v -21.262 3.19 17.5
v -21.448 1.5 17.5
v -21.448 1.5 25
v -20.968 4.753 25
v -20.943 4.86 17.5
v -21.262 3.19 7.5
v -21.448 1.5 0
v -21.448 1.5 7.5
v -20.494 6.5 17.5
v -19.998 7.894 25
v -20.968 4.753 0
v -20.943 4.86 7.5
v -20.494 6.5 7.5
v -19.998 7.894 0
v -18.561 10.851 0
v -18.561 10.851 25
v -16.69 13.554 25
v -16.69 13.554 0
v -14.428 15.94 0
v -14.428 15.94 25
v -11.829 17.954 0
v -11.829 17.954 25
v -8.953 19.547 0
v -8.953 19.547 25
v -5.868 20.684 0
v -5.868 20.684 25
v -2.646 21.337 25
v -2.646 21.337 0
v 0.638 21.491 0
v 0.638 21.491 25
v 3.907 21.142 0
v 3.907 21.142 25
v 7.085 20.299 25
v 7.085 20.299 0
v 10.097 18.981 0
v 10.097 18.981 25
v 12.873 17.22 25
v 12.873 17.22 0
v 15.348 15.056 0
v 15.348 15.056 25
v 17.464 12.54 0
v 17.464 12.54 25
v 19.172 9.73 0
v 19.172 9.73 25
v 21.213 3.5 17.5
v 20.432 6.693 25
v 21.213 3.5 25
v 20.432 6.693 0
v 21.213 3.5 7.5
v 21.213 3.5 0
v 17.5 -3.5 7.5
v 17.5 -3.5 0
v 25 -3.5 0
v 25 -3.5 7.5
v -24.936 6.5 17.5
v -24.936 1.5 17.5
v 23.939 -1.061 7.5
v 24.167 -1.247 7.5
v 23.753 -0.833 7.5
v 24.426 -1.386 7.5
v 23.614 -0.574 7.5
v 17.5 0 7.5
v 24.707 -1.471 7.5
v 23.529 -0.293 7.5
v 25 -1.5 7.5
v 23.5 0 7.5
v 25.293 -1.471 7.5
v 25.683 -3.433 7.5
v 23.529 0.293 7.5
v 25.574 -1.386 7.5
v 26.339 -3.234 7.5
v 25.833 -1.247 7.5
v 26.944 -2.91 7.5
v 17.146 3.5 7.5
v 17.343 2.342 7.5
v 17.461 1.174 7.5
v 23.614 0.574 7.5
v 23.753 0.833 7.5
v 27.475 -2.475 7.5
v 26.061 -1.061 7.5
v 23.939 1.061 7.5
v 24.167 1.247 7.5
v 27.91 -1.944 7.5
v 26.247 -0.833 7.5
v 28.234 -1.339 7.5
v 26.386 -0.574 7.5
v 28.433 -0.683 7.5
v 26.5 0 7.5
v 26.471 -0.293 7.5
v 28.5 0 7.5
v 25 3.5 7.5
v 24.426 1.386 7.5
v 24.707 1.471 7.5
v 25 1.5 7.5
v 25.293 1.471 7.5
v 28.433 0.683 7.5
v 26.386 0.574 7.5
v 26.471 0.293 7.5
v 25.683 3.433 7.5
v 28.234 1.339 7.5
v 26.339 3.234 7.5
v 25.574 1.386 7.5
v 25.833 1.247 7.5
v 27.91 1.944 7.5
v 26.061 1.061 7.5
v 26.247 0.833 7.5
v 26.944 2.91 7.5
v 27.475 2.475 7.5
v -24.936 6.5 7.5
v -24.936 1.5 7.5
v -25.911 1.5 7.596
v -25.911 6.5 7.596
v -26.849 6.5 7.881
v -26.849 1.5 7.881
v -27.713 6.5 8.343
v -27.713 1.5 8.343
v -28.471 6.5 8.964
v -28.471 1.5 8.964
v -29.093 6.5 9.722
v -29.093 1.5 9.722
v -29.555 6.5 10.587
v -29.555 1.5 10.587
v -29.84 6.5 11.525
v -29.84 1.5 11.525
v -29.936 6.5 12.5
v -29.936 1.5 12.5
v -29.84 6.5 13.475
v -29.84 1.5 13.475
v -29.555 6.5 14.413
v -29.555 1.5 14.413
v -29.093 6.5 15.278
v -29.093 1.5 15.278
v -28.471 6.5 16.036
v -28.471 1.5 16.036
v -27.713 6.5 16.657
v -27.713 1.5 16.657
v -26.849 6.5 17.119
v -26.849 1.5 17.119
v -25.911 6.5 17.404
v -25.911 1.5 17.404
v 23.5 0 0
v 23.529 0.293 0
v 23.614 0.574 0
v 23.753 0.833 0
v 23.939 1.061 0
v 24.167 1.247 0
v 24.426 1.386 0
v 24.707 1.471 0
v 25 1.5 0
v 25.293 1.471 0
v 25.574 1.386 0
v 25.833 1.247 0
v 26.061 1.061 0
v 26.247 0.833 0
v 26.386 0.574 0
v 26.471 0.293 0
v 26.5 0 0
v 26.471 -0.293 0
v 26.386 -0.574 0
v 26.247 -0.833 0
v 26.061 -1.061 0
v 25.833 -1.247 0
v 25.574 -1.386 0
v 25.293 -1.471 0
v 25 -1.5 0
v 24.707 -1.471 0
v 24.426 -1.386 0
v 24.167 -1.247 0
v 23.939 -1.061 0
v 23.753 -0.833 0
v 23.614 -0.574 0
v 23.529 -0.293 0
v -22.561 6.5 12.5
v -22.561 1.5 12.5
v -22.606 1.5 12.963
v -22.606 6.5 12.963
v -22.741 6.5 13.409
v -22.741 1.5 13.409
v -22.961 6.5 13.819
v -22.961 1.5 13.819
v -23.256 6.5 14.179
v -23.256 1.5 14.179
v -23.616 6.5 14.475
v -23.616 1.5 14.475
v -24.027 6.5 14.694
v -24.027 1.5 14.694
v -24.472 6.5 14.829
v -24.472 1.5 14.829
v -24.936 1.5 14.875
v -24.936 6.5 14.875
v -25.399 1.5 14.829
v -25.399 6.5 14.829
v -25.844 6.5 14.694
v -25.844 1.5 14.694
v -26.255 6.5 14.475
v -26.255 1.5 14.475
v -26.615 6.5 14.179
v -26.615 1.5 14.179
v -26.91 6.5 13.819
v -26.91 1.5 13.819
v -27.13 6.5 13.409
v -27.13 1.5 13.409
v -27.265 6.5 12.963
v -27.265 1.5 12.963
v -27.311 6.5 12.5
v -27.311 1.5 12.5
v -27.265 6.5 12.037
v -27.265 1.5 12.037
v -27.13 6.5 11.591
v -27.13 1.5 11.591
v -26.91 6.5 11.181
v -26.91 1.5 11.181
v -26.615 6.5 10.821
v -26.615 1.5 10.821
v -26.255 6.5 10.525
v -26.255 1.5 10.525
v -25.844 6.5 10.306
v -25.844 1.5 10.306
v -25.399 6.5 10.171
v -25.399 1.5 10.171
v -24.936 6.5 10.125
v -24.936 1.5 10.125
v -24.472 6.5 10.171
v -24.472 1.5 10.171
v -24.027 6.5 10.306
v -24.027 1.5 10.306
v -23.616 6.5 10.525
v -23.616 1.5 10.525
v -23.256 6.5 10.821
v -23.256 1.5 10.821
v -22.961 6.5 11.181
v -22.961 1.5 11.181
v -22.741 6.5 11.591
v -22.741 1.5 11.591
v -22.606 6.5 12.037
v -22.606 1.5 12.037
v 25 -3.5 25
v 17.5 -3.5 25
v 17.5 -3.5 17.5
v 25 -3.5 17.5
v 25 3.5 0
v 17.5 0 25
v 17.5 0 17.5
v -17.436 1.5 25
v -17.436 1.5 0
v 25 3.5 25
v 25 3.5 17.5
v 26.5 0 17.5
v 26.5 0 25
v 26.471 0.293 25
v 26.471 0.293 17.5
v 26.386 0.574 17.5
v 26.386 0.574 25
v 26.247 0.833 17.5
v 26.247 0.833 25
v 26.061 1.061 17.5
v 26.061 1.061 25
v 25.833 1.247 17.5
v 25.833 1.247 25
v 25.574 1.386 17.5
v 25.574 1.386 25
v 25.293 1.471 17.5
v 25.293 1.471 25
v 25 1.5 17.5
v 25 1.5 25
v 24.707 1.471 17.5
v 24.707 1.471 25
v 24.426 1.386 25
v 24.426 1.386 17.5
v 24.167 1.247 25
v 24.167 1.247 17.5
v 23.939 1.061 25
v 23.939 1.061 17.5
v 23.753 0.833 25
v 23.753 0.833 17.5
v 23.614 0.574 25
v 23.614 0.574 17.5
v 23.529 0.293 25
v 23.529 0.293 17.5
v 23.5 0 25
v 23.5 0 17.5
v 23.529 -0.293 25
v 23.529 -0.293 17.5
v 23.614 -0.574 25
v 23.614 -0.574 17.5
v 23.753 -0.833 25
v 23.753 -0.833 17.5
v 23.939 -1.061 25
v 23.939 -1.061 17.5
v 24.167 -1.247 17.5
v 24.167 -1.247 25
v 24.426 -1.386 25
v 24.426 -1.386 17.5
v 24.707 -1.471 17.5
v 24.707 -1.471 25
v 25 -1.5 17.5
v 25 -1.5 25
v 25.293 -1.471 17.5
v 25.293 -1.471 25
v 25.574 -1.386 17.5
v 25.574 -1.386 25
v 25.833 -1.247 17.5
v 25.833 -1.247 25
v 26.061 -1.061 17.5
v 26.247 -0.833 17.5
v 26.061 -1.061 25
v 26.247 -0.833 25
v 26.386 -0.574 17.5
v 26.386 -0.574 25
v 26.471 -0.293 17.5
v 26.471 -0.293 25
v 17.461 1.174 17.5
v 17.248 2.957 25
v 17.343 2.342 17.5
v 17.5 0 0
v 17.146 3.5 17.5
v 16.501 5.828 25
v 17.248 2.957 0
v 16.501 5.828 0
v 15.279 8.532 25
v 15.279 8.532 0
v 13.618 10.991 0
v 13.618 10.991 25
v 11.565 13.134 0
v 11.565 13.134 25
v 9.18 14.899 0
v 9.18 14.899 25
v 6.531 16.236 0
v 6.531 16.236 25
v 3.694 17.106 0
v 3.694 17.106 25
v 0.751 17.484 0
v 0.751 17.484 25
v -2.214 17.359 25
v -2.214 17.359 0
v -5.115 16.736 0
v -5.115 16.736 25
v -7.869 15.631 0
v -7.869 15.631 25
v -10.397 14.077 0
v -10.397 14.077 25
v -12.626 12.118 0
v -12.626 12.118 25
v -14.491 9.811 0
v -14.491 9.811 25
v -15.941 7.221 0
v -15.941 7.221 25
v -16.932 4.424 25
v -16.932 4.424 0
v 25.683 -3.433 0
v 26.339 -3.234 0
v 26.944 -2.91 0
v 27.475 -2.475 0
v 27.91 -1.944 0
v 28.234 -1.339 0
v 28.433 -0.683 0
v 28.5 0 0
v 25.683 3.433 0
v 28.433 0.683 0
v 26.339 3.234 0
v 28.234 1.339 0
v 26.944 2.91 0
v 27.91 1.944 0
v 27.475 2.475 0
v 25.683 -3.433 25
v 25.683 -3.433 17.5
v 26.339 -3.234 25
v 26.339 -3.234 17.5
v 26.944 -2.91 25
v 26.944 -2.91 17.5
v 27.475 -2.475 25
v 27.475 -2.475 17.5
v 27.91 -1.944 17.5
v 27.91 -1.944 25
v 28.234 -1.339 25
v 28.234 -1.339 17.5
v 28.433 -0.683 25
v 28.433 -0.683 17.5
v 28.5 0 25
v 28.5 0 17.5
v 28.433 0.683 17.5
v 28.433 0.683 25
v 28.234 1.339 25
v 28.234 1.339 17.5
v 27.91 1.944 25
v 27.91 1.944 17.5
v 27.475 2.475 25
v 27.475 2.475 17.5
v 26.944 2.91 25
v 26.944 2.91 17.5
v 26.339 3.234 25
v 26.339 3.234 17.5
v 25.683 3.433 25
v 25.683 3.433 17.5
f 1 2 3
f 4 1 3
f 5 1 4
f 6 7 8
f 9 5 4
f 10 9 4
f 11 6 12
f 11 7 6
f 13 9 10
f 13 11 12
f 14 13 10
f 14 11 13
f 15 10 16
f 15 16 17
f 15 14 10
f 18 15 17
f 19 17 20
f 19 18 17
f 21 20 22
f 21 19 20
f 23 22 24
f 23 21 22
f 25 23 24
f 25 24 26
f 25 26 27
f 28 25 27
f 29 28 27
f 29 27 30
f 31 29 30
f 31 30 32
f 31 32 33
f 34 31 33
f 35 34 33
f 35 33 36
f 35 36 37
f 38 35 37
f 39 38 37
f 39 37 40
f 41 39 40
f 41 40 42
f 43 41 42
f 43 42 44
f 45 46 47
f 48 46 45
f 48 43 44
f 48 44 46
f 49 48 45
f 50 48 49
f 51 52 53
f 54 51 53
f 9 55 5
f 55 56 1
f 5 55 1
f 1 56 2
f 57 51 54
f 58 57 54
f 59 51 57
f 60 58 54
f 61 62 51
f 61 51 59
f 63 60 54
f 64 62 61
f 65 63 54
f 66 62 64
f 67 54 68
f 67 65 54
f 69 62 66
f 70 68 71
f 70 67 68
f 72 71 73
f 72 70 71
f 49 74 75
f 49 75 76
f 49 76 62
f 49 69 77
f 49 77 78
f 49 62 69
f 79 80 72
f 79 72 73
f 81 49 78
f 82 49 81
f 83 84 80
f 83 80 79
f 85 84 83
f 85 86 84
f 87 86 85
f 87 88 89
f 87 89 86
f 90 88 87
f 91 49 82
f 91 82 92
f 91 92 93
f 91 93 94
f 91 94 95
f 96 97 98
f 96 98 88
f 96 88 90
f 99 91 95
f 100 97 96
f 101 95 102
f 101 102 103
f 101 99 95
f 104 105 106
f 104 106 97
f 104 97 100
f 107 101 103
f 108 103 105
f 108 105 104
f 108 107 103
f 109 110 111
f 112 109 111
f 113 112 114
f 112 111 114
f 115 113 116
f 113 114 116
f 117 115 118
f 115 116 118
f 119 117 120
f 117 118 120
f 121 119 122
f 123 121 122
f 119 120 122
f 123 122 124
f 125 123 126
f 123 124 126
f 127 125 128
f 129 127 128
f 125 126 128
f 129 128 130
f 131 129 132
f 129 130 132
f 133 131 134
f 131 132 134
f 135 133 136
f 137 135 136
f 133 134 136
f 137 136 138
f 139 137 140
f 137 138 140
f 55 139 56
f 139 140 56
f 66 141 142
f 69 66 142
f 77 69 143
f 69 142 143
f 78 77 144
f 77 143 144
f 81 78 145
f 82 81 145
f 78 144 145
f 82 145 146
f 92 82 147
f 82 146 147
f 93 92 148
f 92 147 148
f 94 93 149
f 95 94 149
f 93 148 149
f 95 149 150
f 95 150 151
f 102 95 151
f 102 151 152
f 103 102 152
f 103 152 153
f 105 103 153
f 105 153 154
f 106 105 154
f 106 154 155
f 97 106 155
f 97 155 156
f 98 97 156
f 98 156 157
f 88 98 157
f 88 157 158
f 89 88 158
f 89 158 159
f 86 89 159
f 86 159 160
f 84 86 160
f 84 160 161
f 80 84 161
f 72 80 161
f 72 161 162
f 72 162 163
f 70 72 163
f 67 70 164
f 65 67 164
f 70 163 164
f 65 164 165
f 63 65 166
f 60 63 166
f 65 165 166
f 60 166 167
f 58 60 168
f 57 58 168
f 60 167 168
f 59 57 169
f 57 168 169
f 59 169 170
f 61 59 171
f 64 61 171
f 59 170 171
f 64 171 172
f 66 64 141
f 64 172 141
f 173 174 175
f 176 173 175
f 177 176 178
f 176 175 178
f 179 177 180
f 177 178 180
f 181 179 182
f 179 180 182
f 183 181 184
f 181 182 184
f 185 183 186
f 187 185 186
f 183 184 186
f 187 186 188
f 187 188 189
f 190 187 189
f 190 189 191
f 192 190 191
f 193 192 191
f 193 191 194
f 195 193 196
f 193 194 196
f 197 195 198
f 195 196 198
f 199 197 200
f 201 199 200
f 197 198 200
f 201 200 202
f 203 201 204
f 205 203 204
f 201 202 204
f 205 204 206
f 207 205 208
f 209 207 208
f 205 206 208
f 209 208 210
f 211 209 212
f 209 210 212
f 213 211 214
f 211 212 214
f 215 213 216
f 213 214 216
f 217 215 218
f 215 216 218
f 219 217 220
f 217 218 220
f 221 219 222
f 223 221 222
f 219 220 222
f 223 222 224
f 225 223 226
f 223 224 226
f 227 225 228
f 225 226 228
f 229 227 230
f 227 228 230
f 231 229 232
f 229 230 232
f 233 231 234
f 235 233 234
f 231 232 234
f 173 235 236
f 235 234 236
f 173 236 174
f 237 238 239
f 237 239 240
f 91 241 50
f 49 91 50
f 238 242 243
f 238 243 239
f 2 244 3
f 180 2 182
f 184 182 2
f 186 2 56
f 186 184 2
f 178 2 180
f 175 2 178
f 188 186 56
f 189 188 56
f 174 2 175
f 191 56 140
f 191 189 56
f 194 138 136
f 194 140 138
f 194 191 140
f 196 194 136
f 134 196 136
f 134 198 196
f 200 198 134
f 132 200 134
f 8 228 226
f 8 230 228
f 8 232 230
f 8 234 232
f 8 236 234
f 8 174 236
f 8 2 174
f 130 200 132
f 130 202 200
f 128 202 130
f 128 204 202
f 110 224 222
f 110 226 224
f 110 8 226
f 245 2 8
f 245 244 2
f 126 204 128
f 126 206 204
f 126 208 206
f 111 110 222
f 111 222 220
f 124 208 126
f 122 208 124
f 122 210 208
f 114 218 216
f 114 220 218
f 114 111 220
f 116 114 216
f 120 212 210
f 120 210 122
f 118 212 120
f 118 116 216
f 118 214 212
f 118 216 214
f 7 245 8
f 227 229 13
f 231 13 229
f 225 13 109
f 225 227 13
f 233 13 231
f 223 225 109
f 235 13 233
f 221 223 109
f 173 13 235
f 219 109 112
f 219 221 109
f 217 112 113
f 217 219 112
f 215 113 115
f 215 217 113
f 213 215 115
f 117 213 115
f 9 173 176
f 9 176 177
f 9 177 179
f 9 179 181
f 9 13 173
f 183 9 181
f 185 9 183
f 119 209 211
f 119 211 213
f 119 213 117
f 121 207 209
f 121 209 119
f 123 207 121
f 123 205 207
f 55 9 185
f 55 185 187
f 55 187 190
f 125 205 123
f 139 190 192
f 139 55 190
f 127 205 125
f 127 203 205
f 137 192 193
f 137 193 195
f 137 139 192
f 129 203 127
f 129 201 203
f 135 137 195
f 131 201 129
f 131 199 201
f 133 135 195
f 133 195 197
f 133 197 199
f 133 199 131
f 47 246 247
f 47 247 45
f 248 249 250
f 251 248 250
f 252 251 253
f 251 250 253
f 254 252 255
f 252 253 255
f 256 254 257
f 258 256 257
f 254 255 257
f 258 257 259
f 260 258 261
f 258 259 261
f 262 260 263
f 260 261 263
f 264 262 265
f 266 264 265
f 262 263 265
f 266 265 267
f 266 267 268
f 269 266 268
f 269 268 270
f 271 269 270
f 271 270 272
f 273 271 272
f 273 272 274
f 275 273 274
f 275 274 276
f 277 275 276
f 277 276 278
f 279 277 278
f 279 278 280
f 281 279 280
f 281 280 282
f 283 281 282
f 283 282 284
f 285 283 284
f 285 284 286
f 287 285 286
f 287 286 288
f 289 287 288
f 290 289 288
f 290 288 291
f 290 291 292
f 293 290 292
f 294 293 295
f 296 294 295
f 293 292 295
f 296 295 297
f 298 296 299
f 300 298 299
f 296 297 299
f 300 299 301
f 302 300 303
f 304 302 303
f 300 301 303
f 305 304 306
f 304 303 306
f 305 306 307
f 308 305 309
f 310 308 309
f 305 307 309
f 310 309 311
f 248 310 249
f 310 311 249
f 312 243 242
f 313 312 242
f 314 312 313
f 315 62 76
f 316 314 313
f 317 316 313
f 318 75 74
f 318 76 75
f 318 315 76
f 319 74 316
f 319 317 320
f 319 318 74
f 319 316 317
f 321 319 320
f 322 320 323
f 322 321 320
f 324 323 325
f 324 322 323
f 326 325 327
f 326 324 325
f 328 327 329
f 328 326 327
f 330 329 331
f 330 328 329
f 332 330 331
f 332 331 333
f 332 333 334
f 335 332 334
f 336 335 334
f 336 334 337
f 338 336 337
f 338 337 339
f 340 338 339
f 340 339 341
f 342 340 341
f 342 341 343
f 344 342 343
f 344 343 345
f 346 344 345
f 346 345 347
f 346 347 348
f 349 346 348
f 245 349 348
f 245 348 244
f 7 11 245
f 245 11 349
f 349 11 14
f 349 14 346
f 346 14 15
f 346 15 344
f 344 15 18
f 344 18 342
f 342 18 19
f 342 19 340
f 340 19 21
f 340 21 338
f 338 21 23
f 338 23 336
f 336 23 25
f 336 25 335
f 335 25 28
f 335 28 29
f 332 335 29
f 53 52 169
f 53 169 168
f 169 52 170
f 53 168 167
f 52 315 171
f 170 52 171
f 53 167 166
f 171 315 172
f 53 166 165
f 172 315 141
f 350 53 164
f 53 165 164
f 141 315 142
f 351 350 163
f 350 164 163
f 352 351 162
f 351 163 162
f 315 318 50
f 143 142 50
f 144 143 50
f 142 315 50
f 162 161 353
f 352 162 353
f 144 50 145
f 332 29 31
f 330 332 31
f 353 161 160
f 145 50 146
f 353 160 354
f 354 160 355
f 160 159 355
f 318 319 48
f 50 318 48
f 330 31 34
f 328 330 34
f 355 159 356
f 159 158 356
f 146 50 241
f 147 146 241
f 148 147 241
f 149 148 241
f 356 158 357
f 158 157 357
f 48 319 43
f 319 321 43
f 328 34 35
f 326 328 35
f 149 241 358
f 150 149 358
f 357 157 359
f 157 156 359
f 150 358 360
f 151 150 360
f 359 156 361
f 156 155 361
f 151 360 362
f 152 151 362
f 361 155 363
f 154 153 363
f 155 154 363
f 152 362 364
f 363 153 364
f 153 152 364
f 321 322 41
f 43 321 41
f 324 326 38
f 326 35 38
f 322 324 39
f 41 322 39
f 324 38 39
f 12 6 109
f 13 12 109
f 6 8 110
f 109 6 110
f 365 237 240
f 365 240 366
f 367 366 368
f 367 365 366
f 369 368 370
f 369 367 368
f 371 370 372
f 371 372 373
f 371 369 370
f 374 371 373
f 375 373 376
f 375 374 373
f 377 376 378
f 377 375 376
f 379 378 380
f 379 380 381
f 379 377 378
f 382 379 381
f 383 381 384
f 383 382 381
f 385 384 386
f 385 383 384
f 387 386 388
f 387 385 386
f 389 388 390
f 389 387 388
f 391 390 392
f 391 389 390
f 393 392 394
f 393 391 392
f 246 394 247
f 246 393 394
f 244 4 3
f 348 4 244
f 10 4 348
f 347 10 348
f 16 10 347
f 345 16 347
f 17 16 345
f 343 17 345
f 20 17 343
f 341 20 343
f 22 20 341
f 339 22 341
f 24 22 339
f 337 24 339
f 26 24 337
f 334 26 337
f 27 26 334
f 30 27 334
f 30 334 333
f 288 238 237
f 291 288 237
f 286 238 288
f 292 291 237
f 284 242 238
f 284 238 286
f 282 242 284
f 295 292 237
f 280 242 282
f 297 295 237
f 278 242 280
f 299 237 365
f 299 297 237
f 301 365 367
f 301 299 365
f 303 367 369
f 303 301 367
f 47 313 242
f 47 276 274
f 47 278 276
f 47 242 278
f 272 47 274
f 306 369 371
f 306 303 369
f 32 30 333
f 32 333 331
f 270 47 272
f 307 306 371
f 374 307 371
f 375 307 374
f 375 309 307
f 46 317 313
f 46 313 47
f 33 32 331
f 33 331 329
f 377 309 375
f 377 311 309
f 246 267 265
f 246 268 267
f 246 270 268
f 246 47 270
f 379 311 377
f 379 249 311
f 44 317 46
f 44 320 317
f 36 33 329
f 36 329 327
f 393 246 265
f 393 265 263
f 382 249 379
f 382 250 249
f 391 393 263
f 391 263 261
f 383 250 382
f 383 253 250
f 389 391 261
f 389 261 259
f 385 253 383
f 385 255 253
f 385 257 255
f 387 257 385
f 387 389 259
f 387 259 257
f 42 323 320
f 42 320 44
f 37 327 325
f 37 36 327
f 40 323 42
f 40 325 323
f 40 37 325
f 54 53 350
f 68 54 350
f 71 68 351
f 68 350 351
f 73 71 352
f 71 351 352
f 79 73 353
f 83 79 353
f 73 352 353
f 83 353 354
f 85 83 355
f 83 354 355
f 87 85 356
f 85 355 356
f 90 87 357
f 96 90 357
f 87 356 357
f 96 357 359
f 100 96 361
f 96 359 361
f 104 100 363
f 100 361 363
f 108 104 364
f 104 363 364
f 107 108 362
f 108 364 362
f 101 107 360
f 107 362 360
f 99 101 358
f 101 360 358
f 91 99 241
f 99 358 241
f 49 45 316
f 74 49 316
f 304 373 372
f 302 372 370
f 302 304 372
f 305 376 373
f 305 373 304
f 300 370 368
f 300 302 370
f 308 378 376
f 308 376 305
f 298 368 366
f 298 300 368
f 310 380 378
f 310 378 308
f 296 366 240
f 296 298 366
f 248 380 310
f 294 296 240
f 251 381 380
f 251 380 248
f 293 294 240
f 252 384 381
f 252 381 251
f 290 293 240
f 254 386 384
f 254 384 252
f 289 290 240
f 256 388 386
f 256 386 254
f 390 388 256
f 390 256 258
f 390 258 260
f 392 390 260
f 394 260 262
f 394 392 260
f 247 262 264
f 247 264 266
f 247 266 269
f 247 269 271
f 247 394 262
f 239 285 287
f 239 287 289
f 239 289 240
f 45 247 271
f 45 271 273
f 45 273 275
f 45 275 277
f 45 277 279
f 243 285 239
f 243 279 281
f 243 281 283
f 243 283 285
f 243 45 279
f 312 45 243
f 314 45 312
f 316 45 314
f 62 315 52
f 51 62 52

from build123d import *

# Parameters (mm, degrees)
BOSS_EXTRU_1_DEPTH      = 25
ESQUISSE2_R             = 2.375
BOSS_EXTRU_2_DEPTH      = 5
ESQUISSE3_R             = 1.5
BOSS_EXTRU_3_DEPTH      = 7.5
ESQUISSE4_R             = 1.5
BOSS_EXTRU_4_DEPTH      = 7.5
ESQUISSE5_W             = 11.114887109
ESQUISSE5_H             = 10.09418398
ENL_V_MAT_EXTRU_1_DEPTH = 10


with BuildPart() as part:
    # Esquisse1 → Boss.-Extru.1 (new body)
    with BuildSketch(Plane.XY):
        with BuildLine():
            Line((-17.435595774, 1.5), (-21.44761059, 1.5))
            ThreePointArc((-21.44761059, 1.5), (0.750457302, 21.486898656), (21.5, 0))
            Line((21.5, 0), (17.5, 0))
            ThreePointArc((17.5, 0), (0.750690999, 17.48389153), (-17.435595774, 1.5))
        make_face()
    extrude(amount=BOSS_EXTRU_1_DEPTH)

    # Esquisse2 → Boss.-Extru.2 (add)
    with BuildSketch(Plane.XZ.offset(-1.5)):
        with BuildLine():
            Line((-17.435595774, 7.5), (-24.935595774, 7.5))
            ThreePointArc((-24.935595774, 7.5), (-29.935595774, 12.5), (-24.935595774, 17.5))
            Line((-24.935595774, 17.5), (-17.435595774, 17.5))
            Line((-17.435595774, 17.5), (-17.435595774, 7.5))
        make_face()
        with Locations((-24.935595774, 12.5)):
            Circle(ESQUISSE2_R, mode=Mode.SUBTRACT)
    extrude(amount=-BOSS_EXTRU_2_DEPTH)

    # Esquisse3 → Boss.-Extru.3 (add)
    with BuildSketch(Plane.XY.offset(25)):
        with BuildLine():
            Line((17.5, -3.5), (25, -3.5))
            ThreePointArc((25, -3.5), (28.5, 0), (25, 3.5))
            Line((25, 3.5), (17.5, 3.5))
            Line((17.5, 3.5), (17.5, -3.5))
        make_face()
        with Locations((25, 0)):
            Circle(ESQUISSE3_R, mode=Mode.SUBTRACT)
    extrude(amount=-BOSS_EXTRU_3_DEPTH)

    # Esquisse4 → Boss.-Extru.4 (add)
    with BuildSketch(Plane(origin=(0, 0, 0), x_dir=(-1, 0, 0), z_dir=(0, 0, -1))):
        with BuildLine():
            Line((-17.5, -3.5), (-25, -3.5))
            ThreePointArc((-25, -3.5), (-28.5, 0), (-25, 3.5))
            Line((-25, 3.5), (-17.5, 3.5))
            Line((-17.5, 3.5), (-17.5, -3.5))
        make_face()
        with Locations((-25, 0)):
            Circle(ESQUISSE4_R, mode=Mode.SUBTRACT)
    extrude(amount=-BOSS_EXTRU_4_DEPTH)

    # Esquisse5 → Enlèv. mat.-Extru.1 (cut)
    with BuildSketch(Plane(origin=(0, 0, 17.5), x_dir=(-1, 0, 0), z_dir=(0, 0, -1))):
        with Locations((-19.442556445, -1.54709199)):
            Rectangle(ESQUISSE5_W, ESQUISSE5_H)
    extrude(amount=ENL_V_MAT_EXTRU_1_DEPTH, mode=Mode.SUBTRACT)


solid = part.part
